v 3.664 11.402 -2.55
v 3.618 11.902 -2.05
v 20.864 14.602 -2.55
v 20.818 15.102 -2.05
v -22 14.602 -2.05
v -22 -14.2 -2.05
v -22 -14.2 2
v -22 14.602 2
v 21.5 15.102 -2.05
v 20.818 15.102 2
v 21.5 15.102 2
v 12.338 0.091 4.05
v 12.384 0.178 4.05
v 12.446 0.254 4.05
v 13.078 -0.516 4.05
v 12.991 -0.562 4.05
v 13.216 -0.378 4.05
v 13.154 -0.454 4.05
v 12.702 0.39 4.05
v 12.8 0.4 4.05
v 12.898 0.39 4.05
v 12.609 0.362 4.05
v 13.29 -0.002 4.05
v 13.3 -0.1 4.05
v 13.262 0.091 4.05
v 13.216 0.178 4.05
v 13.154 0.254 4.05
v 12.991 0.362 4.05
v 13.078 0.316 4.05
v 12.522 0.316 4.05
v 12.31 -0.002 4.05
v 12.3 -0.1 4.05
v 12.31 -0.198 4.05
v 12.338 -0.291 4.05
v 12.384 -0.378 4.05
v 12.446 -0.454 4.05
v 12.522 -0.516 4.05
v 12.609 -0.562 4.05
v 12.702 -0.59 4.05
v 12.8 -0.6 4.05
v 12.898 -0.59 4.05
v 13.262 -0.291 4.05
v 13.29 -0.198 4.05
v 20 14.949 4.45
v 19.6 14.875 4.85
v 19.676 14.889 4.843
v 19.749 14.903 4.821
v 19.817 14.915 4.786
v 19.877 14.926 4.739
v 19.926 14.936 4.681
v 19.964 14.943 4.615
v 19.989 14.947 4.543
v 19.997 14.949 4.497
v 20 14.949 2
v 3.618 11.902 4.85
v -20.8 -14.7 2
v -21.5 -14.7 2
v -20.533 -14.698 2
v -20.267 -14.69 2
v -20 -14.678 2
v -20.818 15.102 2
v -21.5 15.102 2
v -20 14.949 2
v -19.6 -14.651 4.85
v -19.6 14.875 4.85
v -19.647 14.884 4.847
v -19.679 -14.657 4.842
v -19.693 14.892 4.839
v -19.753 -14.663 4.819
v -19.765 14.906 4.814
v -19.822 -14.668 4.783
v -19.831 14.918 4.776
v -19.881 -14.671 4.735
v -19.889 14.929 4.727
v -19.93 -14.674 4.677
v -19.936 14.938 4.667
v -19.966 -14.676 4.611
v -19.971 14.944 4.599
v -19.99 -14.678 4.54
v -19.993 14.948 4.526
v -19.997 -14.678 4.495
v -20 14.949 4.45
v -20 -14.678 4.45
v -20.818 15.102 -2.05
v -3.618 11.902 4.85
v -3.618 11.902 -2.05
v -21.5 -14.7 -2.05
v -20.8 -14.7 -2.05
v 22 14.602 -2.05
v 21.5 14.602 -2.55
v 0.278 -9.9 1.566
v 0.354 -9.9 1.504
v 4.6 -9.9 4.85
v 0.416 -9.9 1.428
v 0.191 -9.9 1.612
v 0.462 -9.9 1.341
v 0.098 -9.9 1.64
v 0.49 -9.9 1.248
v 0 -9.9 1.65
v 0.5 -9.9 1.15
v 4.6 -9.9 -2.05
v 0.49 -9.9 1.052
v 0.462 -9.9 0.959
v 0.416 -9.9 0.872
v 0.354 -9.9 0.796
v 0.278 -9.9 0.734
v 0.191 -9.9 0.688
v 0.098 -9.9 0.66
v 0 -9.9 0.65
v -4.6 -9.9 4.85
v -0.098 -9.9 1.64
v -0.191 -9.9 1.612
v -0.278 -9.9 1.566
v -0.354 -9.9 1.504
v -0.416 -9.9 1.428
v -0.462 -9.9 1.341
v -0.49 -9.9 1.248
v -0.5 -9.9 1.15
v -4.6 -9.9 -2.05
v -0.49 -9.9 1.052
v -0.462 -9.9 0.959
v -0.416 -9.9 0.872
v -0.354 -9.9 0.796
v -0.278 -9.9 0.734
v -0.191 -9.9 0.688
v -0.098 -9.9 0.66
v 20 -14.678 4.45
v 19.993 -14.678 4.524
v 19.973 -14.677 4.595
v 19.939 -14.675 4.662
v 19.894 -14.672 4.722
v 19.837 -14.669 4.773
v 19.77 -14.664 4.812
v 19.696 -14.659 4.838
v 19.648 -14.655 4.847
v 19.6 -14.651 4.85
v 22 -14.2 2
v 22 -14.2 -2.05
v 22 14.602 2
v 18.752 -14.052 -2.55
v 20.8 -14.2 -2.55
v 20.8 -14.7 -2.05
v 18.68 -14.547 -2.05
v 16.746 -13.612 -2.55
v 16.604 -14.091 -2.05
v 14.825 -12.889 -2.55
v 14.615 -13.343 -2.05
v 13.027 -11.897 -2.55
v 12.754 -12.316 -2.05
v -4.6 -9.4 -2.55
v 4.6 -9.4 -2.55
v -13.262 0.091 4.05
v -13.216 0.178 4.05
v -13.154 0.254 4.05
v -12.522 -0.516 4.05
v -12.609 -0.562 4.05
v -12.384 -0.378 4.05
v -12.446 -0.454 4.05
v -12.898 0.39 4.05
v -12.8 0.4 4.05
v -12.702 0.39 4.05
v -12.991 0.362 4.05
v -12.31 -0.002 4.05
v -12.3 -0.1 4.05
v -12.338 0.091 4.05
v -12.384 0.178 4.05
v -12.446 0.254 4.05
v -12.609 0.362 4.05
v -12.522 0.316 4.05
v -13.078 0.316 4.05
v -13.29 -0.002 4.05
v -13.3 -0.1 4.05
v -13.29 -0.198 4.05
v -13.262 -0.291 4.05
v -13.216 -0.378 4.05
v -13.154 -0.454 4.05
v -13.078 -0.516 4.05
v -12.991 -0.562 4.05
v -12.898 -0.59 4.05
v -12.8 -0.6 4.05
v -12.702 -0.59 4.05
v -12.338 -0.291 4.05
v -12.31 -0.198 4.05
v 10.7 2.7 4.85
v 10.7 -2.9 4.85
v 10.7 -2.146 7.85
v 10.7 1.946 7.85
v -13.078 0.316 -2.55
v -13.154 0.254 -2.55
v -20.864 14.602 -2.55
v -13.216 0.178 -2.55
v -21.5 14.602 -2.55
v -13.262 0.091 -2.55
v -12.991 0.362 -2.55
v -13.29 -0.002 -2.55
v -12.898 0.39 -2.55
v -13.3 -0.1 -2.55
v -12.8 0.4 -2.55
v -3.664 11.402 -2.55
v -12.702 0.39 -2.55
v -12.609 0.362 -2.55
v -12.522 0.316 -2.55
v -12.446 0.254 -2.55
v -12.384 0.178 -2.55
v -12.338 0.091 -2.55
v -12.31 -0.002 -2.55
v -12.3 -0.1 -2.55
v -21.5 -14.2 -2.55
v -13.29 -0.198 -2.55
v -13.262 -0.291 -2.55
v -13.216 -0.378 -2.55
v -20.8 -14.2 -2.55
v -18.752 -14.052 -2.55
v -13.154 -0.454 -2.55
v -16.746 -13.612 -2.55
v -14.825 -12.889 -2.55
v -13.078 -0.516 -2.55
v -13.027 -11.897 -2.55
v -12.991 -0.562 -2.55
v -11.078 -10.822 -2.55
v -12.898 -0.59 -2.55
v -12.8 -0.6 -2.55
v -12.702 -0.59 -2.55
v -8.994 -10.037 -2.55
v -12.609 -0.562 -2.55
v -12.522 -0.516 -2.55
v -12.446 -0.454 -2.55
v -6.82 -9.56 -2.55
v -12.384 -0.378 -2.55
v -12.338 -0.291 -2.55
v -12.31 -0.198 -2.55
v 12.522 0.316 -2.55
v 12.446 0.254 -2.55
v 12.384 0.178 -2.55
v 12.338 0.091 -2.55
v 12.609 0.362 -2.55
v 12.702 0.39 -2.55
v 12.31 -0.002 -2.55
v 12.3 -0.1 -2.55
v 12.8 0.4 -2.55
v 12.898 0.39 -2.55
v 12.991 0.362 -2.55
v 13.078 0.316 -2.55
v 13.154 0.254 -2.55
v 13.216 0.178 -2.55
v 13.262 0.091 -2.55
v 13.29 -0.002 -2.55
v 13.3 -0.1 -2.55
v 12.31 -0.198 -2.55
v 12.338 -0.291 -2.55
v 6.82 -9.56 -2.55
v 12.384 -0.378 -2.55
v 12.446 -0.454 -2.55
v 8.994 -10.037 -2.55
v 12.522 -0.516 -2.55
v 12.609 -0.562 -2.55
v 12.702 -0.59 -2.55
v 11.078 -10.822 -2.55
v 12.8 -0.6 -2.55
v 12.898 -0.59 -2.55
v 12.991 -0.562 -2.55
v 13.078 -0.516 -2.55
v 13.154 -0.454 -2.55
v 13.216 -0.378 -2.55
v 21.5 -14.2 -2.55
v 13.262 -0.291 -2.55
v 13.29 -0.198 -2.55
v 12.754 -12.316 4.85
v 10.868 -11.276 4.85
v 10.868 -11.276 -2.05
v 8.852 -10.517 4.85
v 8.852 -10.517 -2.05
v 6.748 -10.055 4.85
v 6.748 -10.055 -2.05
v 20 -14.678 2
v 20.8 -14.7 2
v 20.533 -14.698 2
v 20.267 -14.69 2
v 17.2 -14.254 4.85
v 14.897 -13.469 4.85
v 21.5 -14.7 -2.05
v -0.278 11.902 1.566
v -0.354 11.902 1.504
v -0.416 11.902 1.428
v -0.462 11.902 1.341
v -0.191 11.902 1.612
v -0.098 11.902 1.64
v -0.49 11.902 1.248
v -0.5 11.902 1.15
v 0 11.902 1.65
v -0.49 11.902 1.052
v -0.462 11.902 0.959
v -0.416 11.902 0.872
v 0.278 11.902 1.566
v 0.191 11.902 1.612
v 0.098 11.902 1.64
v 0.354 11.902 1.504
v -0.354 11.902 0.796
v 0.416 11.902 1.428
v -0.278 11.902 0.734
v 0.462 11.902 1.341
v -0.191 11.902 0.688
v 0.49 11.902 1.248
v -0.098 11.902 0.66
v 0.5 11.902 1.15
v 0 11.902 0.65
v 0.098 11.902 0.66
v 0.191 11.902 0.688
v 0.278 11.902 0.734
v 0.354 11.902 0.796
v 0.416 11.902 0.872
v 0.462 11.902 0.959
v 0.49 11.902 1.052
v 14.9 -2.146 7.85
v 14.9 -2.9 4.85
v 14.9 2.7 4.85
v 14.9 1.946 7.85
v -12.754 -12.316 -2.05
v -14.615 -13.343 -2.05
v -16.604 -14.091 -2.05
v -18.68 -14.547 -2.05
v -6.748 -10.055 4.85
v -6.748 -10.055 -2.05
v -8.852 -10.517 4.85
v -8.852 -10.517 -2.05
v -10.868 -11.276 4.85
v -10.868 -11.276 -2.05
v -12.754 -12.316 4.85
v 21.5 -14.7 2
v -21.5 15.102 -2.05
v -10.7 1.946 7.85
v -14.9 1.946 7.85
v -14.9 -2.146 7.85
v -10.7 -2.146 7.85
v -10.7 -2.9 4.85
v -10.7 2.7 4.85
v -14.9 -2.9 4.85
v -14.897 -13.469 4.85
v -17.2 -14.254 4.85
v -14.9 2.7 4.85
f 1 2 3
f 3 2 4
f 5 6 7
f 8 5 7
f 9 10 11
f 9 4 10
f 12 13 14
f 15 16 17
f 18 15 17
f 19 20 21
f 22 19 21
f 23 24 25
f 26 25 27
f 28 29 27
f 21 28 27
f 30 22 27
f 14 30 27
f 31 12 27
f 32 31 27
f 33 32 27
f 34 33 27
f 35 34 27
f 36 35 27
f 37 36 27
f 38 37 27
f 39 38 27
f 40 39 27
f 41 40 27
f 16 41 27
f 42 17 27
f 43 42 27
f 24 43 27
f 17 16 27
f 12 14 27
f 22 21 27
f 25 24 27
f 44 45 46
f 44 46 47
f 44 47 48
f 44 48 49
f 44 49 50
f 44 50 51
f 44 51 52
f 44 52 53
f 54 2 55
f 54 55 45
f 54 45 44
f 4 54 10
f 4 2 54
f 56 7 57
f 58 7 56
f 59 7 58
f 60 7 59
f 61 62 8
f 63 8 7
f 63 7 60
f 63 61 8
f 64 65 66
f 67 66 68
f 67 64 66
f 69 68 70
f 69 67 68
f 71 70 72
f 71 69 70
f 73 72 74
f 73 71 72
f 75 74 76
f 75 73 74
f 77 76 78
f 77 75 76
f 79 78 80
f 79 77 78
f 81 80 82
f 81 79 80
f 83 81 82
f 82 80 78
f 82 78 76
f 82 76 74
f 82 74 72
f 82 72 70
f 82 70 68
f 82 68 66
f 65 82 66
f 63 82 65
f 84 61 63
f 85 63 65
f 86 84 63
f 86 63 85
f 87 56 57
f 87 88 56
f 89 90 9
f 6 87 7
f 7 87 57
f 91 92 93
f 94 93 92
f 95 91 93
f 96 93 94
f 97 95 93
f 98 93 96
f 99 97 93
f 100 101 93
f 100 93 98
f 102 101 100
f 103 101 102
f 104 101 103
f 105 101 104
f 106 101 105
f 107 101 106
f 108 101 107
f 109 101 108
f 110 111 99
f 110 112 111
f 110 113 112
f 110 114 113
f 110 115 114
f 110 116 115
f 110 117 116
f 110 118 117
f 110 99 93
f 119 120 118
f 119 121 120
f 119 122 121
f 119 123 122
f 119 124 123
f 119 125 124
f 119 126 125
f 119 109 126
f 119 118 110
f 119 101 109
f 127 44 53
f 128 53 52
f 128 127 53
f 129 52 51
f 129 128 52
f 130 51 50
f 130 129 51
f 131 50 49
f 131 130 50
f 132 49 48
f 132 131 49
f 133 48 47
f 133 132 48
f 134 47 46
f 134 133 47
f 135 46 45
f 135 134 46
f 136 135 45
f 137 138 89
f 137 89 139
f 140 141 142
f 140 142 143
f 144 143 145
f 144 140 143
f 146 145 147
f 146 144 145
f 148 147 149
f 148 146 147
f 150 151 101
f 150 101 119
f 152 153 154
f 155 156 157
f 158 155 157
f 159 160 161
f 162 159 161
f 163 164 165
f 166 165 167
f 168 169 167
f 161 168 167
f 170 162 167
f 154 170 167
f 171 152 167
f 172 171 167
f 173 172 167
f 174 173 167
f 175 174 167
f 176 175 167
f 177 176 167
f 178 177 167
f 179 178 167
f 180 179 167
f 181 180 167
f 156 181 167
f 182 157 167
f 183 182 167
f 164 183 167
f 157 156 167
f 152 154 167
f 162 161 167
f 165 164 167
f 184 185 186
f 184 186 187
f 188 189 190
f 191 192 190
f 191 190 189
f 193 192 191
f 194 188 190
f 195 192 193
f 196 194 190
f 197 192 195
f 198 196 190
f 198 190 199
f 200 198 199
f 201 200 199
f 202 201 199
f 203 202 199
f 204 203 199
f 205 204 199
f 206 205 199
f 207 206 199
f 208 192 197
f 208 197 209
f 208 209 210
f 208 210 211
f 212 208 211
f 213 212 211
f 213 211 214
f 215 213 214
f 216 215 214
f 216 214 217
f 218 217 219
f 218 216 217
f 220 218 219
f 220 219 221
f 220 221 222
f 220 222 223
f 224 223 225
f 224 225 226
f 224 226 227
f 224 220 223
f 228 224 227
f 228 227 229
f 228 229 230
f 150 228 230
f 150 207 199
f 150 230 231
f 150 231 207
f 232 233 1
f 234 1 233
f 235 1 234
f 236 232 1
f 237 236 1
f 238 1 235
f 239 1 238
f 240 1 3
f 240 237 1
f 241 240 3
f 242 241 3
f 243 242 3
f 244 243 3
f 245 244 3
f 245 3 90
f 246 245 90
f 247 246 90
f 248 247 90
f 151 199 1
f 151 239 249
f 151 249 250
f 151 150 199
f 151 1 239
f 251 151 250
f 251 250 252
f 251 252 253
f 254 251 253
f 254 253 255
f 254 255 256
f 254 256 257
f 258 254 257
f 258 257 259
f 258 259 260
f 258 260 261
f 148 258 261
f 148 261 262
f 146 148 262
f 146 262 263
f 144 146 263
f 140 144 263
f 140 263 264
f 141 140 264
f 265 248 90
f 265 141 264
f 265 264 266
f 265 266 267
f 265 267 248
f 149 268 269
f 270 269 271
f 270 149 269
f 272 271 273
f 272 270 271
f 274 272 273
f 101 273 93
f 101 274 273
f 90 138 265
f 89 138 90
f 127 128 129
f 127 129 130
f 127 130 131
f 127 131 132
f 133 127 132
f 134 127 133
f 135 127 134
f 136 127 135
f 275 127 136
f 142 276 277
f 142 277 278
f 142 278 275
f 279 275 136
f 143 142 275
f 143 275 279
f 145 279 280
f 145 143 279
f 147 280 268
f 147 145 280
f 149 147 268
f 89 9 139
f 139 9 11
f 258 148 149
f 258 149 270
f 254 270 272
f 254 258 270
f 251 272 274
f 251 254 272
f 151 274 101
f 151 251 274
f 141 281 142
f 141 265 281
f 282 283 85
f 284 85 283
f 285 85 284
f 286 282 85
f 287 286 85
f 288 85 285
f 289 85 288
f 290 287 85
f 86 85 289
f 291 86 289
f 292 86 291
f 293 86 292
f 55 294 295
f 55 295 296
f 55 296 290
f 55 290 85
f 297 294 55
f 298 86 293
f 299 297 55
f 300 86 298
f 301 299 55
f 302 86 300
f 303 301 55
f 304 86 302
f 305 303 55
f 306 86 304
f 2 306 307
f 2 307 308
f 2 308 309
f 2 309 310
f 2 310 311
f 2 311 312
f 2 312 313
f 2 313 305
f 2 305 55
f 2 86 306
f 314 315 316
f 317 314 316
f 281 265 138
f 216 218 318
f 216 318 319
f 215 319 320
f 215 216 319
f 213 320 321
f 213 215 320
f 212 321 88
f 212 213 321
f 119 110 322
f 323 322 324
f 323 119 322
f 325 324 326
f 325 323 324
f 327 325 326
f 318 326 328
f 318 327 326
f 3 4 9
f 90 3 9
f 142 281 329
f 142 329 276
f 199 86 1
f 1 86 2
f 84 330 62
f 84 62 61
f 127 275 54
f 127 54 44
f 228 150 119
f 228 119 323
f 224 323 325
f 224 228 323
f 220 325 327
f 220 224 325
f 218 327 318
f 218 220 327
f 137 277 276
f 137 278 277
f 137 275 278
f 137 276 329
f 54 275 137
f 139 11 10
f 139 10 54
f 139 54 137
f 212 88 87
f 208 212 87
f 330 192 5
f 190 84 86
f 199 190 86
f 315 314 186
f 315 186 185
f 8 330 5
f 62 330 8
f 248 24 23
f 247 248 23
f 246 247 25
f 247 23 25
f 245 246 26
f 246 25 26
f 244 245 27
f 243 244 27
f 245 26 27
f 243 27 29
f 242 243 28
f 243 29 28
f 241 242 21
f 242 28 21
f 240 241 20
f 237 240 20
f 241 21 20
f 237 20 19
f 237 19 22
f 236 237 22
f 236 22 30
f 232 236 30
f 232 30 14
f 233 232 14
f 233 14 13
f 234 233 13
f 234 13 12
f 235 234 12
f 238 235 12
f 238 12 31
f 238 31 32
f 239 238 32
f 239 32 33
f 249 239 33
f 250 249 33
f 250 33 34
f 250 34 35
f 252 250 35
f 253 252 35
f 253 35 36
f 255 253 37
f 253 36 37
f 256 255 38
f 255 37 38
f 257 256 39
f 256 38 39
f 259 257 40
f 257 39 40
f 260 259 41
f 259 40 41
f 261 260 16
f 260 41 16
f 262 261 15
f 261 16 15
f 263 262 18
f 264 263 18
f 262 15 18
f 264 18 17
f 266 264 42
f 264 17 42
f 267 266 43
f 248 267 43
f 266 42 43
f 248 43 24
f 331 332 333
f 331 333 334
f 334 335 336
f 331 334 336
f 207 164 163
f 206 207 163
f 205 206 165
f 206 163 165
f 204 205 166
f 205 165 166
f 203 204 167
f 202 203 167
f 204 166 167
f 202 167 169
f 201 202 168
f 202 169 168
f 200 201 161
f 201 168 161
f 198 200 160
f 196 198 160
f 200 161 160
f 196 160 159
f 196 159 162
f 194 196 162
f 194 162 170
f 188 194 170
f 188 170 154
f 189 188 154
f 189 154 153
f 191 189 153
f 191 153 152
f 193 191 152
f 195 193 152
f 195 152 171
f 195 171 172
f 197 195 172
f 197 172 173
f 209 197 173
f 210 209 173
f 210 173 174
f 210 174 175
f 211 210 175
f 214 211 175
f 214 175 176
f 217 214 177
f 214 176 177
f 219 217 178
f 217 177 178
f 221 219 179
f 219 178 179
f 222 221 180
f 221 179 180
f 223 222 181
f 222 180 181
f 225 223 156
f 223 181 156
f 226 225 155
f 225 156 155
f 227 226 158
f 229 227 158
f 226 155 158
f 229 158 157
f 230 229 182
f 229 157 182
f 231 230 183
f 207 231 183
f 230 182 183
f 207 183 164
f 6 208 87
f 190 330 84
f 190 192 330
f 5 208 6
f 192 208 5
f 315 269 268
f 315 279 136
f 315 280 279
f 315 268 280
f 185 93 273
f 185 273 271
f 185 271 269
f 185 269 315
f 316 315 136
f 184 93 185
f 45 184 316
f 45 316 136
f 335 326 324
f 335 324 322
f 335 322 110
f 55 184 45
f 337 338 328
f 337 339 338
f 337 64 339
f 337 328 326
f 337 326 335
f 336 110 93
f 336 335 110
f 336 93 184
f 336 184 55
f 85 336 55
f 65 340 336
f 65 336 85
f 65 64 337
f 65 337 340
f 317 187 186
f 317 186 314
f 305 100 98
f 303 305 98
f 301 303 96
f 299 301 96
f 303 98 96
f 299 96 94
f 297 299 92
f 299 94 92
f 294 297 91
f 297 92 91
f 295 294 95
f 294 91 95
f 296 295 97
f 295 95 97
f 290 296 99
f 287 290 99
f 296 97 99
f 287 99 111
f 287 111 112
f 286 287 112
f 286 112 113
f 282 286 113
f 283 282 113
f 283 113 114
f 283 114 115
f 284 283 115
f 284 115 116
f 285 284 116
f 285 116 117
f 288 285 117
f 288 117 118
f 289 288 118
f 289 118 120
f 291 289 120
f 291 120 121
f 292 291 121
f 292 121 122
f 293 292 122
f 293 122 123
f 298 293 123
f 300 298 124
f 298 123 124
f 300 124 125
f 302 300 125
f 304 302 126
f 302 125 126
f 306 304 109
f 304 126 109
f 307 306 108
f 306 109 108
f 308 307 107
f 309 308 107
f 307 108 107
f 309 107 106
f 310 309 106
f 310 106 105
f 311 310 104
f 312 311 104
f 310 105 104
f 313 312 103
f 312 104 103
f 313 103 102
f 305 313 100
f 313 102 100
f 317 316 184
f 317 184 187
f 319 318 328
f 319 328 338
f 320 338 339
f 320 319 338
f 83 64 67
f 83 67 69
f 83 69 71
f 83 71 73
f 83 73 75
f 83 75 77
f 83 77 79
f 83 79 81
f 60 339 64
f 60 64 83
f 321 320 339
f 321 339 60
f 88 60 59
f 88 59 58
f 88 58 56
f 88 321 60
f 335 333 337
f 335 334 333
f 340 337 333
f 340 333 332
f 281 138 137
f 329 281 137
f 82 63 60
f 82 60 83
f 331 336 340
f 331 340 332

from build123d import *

# Parameters (mm, degrees)
SKETCH_W        = 44
SKETCH_H        = 42
PAD_DEPTH       = 2
SKETCH001_W     = 40
SKETCH001_H     = 42
PAD001_DEPTH    = 2.85
SKETCH002_W     = 4.2
SKETCH002_H     = 5.6
PAD002_DEPTH    = 3
POCKET_DEPTH    = 44.001
SKETCH004_W     = 40
SKETCH004_H     = 8.35
PAD003_DEPTH    = 15
SKETCH005_W     = 40
SKETCH005_H     = 8.35
PAD004_DEPTH    = 15
POCKET001_DEPTH = 42.001
POCKET002_DEPTH = 13.201
FILLET_R        = 0.4
SKETCH008_W     = 44
SKETCH008_H     = 2.55
PAD005_DEPTH    = 42
POCKET003_DEPTH = 2.551
SKETCH009_R     = 0.5
POCKET004_DEPTH = 42.001
POCKET010_DEPTH = 17.851
CHAMFER002_SIZE = 0.5
POCKET017_START = -0.8
SKETCH019_R     = 0.5
POCKET017_DEPTH = 24.2


with BuildPart() as part:
    # Sketch → Pad (new body)
    with BuildSketch(Plane.XY):
        Rectangle(SKETCH_W, SKETCH_H)
    extrude(amount=PAD_DEPTH)

    # Sketch001 (on Face6 of Pad) → Pad001 (join)
    with BuildSketch(Plane.XY.offset(2)):
        Rectangle(SKETCH001_W, SKETCH001_H)
    extrude(amount=PAD001_DEPTH)

    # Sketch002 (on Face8 of Pad001) → Pad002 (join)
    with BuildSketch(Plane.XY.offset(4.85)):
        with Locations((-12.8, -0.1)):
            Rectangle(SKETCH002_W, SKETCH002_H)
        with Locations((12.8, -0.1)):
            Rectangle(SKETCH002_W, SKETCH002_H)
    extrude(amount=PAD002_DEPTH)

    # Sketch003 (on Face1 of Pad002) → Pocket (cut, through all)
    with BuildSketch(Plane.YZ.offset(22)):
        Polygon((-2.9, 4.85), (-2.9, 8.35), (-2.02, 8.35), align=None)
        Polygon((2.7, 8.35), (2.7, 4.85), (1.82, 8.35), align=None)
    extrude(amount=-POCKET_DEPTH, mode=Mode.SUBTRACT)

    # Sketch004 (on Face2 of Pocket) → Pad003 (join)
    with BuildSketch(Plane.XZ.offset(21)):
        with Locations((0, 9.025)):
            Rectangle(SKETCH004_W, SKETCH004_H)
    extrude(amount=-PAD003_DEPTH)

    # Sketch005 (on Face2 of Pad003) → Pad004 (join)
    with BuildSketch(Plane(origin=(0, 21, 0), x_dir=(-1, 0, 0), z_dir=(0, 1, 0))):
        with Locations((0, 9.025)):
            Rectangle(SKETCH005_W, SKETCH005_H)
    extrude(amount=-PAD004_DEPTH)

    # Sketch006 (on Face24 of Pad004) → Pocket001 (cut, through all)
    with BuildSketch(Plane(origin=(-20, 0, 0), x_dir=(0, -1, 0), z_dir=(-1, 0, 0))):
        with BuildLine():
            Line((-21, 13.2), (-20, 13.2))
            ThreePointArc((-20, 13.2), (-20.707107, 12.907107), (-21, 12.2))
            Line((-21, 12.2), (-21, 13.2))
        make_face()
        with BuildLine():
            ThreePointArc((-15, 12.2), (-15.292893, 12.907107), (-16, 13.2))
            Line((-16, 13.2), (-6, 13.2))
            Line((-6, 13.2), (-6, 4.85))
            Line((-6, 4.85), (-18.25, 4.85))
            Line((-18.25, 10.6), (-18.25, 4.85))
            Line((-17.125, 10.6), (-18.25, 10.6))
            ThreePointArc((-17.125, 10.6), (-15.794998, 11.044723), (-15, 12.2))
        make_face()
        with BuildLine():
            Line((18.35, 4.85), (18.35, 11.2))
            Line((18.35, 11.2), (16, 11.2))
            ThreePointArc((16, 13.2), (15, 12.2), (16, 11.2))
            Line((6, 13.2), (16, 13.2))
            Line((6, 4.85), (6, 13.2))
            Line((6, 4.85), (18.35, 4.85))
        make_face()
    extrude(amount=-POCKET001_DEPTH, mode=Mode.SUBTRACT)

    # Sketch007 (on Face18 of Pocket001) → Pocket002 (cut, through all)
    with BuildSketch(Plane(origin=(0, 0, 0), x_dir=(1, 0, 0), z_dir=(0, 0, -1))):
        with BuildLine():
            ThreePointArc((-17, 21), (-20.535534, 19.535534), (-22, 16))
            Line((-22, 21), (-22, 16))
            Line((-17, 21), (-22, 21))
        make_face()
        with BuildLine():
            ThreePointArc((22, 16), (20.535534, 19.535534), (17, 21))
            Line((22, 21), (17, 21))
            Line((22, 16), (22, 21))
        make_face()
        with BuildLine():
            ThreePointArc((17, -21), (20.535534, -19.535534), (22, -16))
            Line((22, -21), (22, -16))
            Line((22, -21), (17, -21))
        make_face()
        with BuildLine():
            ThreePointArc((-22, -16), (-20.535534, -19.535534), (-17, -21))
            Line((-22, -21), (-17, -21))
            Line((-22, -16), (-22, -21))
        make_face()
    extrude(amount=-POCKET002_DEPTH, mode=Mode.SUBTRACT)

    # Fillet
    fillet_edges = [part.edges().sort_by_distance(p)[0] for p in [
        (0, -21, 13.2),
        (20, -18, 13.2),
        (-20, -18, 13.2),
        (20, -18.35, 8.025),
        (-20, -18.35, 8.025),
        (-20, 18, 13.2),
        (20, 18, 13.2),
        (20, 17.6875, 10.6),
        (20, 18.25, 7.725),
        (-20, 18.25, 7.725),
        (-20, 17.6875, 10.6),
        (20, -0.05, 4.85),
        (-20, -0.05, 4.85),
    ]]
    fillet(fillet_edges, radius=FILLET_R)

    # Sketch008 (on Face15 of Clone) → Pad005 (new body)
    with BuildSketch(Plane.XZ.offset(21)):
        with Locations((0, -1.275)):
            Rectangle(SKETCH008_W, SKETCH008_H)
    extrude(amount=-PAD005_DEPTH)

    # ShapeBinder → Pocket003 (cut, through all)
    with BuildSketch(Plane(origin=(-20.88316, 19.88316, 0), x_dir=(0, 1, 0), z_dir=(0, 0, 1))):
        with BuildLine():
            Line((1.11684, 1.11684), (-3.88316, 1.11684))
            ThreePointArc((-3.88316, 1.11684), (-0.347626, -0.347626), (1.11684, -3.88316))
            Line((1.11684, -3.88316), (1.11684, 1.11684))
        make_face()
        with BuildLine():
            Line((-40.88316, 1.11684), (-40.88316, -3.88316))
            ThreePointArc((-40.88316, -3.88316), (-39.418694, -0.347626), (-35.88316, 1.11684))
            Line((-35.88316, 1.11684), (-40.88316, 1.11684))
        make_face()
        with BuildLine():
            Line((-40.88316, -37.88316), (-40.88316, -42.88316))
            Line((-40.88316, -42.88316), (-35.88316, -42.88316))
            ThreePointArc((-35.88316, -42.88316), (-39.418694, -41.418694), (-40.88316, -37.88316))
        make_face()
        with BuildLine():
            ThreePointArc((1.11684, -37.88316), (-0.347626, -41.418694), (-3.88316, -42.88316))
            Line((-3.88316, -42.88316), (1.11684, -42.88316))
            Line((1.11684, -42.88316), (1.11684, -37.88316))
        make_face()
    extrude(amount=-POCKET003_DEPTH, mode=Mode.SUBTRACT)

    # Sketch009 (on Face29 of Pocket003) → Pocket004 (cut, through all)
    with BuildSketch(Plane.XZ.offset(21)):
        with Locations((0, 1.15)):
            Circle(SKETCH009_R)
    extrude(amount=-POCKET004_DEPTH, mode=Mode.SUBTRACT)

    # ShapeBinder005 → Pocket010 (cut, through all)
    with BuildSketch(Plane(origin=(0, -16.15872, -4.65), x_dir=(0, 1, 0), z_dir=(0, 0, 1))):
        with BuildLine():
            Line((1.45872, -22), (1.45872, -20.8))
            ThreePointArc((1.45872, -20.8), (2.067221, -16.604371), (3.842579, -12.754477))
            ThreePointArc((3.842579, -12.754477), (5.641979, -8.852447), (6.25872, -4.6))
            Line((6.25872, -4.6), (6.25872, 4.6))
            ThreePointArc((6.25872, 4.6), (5.641979, 8.852447), (3.842579, 12.754477))
            ThreePointArc((3.842579, 12.754477), (2.067221, 16.60437), (1.45872, 20.8))
            Line((1.45872, 20.8), (1.45872, 22))
            Line((1.45872, 22), (0.15872, 22))
            ThreePointArc((0.15872, 22), (-3.376814, 20.535534), (-4.84128, 17))
            Line((-4.84128, 17), (-4.84128, -17))
            ThreePointArc((-4.84128, -17), (-3.376814, -20.535534), (0.15872, -22))
            Line((0.15872, -22), (1.45872, -22))
        make_face()
        with BuildLine():
            Line((37.15872, -17), (37.15872, 17))
            ThreePointArc((37.15872, 17), (35.694254, 20.535534), (32.15872, 22))
            Line((32.15872, 22), (31.260407, 22))
            Line((31.260407, 22), (31.260407, 20.818291))
            Line((31.260407, 20.818291), (28.060407, 3.618291))
            Line((28.060407, 3.618291), (28.060407, -3.618291))
            Line((28.060407, -3.618291), (31.260407, -20.818291))
            Line((31.260407, -20.818291), (31.260407, -22))
            Line((31.260407, -22), (32.15872, -22))
            ThreePointArc((32.15872, -22), (35.694254, -20.535534), (37.15872, -17))
        make_face()
    extrude(amount=POCKET010_DEPTH, mode=Mode.SUBTRACT)

    # Chamfer002
    chamfer002_edges = [part.edges().sort_by_distance(p)[0] for p in [
        (-21.4, -14.7, -2.55),
        (-16.604371, -14.0915, -2.55),
        (-8.852447, -10.516741, -2.55),
        (0, -9.9, -2.55),
        (8.852447, -10.516741, -2.55),
        (16.604371, -14.0915, -2.55),
        (21.4, -14.7, -2.55),
        (22, 0.200843, -2.55),
        (21.409145, 15.101687, -2.55),
        (12.218291, 13.501687, -2.55),
        (0, 11.901687, -2.55),
        (-12.218291, 13.501687, -2.55),
        (-21.409145, 15.101687, -2.55),
        (-22, 0.200843, -2.55),
        (22, 15.101687, -0.275),
        (22, -14.7, -0.275),
        (-22, -14.7, -0.275),
        (-22, 15.101687, -0.275),
    ]]
    chamfer(chamfer002_edges, length=CHAMFER002_SIZE)

    # Sketch019 → Pocket017 (cut)
    with BuildSketch(Plane.XY.offset(4.85).offset(POCKET017_START)):
        with Locations((-12.8, -0.1)):
            Circle(SKETCH019_R)
        with Locations((12.8, -0.1)):
            Circle(SKETCH019_R)
    extrude(amount=-POCKET017_DEPTH, mode=Mode.SUBTRACT)


solid = part.part
